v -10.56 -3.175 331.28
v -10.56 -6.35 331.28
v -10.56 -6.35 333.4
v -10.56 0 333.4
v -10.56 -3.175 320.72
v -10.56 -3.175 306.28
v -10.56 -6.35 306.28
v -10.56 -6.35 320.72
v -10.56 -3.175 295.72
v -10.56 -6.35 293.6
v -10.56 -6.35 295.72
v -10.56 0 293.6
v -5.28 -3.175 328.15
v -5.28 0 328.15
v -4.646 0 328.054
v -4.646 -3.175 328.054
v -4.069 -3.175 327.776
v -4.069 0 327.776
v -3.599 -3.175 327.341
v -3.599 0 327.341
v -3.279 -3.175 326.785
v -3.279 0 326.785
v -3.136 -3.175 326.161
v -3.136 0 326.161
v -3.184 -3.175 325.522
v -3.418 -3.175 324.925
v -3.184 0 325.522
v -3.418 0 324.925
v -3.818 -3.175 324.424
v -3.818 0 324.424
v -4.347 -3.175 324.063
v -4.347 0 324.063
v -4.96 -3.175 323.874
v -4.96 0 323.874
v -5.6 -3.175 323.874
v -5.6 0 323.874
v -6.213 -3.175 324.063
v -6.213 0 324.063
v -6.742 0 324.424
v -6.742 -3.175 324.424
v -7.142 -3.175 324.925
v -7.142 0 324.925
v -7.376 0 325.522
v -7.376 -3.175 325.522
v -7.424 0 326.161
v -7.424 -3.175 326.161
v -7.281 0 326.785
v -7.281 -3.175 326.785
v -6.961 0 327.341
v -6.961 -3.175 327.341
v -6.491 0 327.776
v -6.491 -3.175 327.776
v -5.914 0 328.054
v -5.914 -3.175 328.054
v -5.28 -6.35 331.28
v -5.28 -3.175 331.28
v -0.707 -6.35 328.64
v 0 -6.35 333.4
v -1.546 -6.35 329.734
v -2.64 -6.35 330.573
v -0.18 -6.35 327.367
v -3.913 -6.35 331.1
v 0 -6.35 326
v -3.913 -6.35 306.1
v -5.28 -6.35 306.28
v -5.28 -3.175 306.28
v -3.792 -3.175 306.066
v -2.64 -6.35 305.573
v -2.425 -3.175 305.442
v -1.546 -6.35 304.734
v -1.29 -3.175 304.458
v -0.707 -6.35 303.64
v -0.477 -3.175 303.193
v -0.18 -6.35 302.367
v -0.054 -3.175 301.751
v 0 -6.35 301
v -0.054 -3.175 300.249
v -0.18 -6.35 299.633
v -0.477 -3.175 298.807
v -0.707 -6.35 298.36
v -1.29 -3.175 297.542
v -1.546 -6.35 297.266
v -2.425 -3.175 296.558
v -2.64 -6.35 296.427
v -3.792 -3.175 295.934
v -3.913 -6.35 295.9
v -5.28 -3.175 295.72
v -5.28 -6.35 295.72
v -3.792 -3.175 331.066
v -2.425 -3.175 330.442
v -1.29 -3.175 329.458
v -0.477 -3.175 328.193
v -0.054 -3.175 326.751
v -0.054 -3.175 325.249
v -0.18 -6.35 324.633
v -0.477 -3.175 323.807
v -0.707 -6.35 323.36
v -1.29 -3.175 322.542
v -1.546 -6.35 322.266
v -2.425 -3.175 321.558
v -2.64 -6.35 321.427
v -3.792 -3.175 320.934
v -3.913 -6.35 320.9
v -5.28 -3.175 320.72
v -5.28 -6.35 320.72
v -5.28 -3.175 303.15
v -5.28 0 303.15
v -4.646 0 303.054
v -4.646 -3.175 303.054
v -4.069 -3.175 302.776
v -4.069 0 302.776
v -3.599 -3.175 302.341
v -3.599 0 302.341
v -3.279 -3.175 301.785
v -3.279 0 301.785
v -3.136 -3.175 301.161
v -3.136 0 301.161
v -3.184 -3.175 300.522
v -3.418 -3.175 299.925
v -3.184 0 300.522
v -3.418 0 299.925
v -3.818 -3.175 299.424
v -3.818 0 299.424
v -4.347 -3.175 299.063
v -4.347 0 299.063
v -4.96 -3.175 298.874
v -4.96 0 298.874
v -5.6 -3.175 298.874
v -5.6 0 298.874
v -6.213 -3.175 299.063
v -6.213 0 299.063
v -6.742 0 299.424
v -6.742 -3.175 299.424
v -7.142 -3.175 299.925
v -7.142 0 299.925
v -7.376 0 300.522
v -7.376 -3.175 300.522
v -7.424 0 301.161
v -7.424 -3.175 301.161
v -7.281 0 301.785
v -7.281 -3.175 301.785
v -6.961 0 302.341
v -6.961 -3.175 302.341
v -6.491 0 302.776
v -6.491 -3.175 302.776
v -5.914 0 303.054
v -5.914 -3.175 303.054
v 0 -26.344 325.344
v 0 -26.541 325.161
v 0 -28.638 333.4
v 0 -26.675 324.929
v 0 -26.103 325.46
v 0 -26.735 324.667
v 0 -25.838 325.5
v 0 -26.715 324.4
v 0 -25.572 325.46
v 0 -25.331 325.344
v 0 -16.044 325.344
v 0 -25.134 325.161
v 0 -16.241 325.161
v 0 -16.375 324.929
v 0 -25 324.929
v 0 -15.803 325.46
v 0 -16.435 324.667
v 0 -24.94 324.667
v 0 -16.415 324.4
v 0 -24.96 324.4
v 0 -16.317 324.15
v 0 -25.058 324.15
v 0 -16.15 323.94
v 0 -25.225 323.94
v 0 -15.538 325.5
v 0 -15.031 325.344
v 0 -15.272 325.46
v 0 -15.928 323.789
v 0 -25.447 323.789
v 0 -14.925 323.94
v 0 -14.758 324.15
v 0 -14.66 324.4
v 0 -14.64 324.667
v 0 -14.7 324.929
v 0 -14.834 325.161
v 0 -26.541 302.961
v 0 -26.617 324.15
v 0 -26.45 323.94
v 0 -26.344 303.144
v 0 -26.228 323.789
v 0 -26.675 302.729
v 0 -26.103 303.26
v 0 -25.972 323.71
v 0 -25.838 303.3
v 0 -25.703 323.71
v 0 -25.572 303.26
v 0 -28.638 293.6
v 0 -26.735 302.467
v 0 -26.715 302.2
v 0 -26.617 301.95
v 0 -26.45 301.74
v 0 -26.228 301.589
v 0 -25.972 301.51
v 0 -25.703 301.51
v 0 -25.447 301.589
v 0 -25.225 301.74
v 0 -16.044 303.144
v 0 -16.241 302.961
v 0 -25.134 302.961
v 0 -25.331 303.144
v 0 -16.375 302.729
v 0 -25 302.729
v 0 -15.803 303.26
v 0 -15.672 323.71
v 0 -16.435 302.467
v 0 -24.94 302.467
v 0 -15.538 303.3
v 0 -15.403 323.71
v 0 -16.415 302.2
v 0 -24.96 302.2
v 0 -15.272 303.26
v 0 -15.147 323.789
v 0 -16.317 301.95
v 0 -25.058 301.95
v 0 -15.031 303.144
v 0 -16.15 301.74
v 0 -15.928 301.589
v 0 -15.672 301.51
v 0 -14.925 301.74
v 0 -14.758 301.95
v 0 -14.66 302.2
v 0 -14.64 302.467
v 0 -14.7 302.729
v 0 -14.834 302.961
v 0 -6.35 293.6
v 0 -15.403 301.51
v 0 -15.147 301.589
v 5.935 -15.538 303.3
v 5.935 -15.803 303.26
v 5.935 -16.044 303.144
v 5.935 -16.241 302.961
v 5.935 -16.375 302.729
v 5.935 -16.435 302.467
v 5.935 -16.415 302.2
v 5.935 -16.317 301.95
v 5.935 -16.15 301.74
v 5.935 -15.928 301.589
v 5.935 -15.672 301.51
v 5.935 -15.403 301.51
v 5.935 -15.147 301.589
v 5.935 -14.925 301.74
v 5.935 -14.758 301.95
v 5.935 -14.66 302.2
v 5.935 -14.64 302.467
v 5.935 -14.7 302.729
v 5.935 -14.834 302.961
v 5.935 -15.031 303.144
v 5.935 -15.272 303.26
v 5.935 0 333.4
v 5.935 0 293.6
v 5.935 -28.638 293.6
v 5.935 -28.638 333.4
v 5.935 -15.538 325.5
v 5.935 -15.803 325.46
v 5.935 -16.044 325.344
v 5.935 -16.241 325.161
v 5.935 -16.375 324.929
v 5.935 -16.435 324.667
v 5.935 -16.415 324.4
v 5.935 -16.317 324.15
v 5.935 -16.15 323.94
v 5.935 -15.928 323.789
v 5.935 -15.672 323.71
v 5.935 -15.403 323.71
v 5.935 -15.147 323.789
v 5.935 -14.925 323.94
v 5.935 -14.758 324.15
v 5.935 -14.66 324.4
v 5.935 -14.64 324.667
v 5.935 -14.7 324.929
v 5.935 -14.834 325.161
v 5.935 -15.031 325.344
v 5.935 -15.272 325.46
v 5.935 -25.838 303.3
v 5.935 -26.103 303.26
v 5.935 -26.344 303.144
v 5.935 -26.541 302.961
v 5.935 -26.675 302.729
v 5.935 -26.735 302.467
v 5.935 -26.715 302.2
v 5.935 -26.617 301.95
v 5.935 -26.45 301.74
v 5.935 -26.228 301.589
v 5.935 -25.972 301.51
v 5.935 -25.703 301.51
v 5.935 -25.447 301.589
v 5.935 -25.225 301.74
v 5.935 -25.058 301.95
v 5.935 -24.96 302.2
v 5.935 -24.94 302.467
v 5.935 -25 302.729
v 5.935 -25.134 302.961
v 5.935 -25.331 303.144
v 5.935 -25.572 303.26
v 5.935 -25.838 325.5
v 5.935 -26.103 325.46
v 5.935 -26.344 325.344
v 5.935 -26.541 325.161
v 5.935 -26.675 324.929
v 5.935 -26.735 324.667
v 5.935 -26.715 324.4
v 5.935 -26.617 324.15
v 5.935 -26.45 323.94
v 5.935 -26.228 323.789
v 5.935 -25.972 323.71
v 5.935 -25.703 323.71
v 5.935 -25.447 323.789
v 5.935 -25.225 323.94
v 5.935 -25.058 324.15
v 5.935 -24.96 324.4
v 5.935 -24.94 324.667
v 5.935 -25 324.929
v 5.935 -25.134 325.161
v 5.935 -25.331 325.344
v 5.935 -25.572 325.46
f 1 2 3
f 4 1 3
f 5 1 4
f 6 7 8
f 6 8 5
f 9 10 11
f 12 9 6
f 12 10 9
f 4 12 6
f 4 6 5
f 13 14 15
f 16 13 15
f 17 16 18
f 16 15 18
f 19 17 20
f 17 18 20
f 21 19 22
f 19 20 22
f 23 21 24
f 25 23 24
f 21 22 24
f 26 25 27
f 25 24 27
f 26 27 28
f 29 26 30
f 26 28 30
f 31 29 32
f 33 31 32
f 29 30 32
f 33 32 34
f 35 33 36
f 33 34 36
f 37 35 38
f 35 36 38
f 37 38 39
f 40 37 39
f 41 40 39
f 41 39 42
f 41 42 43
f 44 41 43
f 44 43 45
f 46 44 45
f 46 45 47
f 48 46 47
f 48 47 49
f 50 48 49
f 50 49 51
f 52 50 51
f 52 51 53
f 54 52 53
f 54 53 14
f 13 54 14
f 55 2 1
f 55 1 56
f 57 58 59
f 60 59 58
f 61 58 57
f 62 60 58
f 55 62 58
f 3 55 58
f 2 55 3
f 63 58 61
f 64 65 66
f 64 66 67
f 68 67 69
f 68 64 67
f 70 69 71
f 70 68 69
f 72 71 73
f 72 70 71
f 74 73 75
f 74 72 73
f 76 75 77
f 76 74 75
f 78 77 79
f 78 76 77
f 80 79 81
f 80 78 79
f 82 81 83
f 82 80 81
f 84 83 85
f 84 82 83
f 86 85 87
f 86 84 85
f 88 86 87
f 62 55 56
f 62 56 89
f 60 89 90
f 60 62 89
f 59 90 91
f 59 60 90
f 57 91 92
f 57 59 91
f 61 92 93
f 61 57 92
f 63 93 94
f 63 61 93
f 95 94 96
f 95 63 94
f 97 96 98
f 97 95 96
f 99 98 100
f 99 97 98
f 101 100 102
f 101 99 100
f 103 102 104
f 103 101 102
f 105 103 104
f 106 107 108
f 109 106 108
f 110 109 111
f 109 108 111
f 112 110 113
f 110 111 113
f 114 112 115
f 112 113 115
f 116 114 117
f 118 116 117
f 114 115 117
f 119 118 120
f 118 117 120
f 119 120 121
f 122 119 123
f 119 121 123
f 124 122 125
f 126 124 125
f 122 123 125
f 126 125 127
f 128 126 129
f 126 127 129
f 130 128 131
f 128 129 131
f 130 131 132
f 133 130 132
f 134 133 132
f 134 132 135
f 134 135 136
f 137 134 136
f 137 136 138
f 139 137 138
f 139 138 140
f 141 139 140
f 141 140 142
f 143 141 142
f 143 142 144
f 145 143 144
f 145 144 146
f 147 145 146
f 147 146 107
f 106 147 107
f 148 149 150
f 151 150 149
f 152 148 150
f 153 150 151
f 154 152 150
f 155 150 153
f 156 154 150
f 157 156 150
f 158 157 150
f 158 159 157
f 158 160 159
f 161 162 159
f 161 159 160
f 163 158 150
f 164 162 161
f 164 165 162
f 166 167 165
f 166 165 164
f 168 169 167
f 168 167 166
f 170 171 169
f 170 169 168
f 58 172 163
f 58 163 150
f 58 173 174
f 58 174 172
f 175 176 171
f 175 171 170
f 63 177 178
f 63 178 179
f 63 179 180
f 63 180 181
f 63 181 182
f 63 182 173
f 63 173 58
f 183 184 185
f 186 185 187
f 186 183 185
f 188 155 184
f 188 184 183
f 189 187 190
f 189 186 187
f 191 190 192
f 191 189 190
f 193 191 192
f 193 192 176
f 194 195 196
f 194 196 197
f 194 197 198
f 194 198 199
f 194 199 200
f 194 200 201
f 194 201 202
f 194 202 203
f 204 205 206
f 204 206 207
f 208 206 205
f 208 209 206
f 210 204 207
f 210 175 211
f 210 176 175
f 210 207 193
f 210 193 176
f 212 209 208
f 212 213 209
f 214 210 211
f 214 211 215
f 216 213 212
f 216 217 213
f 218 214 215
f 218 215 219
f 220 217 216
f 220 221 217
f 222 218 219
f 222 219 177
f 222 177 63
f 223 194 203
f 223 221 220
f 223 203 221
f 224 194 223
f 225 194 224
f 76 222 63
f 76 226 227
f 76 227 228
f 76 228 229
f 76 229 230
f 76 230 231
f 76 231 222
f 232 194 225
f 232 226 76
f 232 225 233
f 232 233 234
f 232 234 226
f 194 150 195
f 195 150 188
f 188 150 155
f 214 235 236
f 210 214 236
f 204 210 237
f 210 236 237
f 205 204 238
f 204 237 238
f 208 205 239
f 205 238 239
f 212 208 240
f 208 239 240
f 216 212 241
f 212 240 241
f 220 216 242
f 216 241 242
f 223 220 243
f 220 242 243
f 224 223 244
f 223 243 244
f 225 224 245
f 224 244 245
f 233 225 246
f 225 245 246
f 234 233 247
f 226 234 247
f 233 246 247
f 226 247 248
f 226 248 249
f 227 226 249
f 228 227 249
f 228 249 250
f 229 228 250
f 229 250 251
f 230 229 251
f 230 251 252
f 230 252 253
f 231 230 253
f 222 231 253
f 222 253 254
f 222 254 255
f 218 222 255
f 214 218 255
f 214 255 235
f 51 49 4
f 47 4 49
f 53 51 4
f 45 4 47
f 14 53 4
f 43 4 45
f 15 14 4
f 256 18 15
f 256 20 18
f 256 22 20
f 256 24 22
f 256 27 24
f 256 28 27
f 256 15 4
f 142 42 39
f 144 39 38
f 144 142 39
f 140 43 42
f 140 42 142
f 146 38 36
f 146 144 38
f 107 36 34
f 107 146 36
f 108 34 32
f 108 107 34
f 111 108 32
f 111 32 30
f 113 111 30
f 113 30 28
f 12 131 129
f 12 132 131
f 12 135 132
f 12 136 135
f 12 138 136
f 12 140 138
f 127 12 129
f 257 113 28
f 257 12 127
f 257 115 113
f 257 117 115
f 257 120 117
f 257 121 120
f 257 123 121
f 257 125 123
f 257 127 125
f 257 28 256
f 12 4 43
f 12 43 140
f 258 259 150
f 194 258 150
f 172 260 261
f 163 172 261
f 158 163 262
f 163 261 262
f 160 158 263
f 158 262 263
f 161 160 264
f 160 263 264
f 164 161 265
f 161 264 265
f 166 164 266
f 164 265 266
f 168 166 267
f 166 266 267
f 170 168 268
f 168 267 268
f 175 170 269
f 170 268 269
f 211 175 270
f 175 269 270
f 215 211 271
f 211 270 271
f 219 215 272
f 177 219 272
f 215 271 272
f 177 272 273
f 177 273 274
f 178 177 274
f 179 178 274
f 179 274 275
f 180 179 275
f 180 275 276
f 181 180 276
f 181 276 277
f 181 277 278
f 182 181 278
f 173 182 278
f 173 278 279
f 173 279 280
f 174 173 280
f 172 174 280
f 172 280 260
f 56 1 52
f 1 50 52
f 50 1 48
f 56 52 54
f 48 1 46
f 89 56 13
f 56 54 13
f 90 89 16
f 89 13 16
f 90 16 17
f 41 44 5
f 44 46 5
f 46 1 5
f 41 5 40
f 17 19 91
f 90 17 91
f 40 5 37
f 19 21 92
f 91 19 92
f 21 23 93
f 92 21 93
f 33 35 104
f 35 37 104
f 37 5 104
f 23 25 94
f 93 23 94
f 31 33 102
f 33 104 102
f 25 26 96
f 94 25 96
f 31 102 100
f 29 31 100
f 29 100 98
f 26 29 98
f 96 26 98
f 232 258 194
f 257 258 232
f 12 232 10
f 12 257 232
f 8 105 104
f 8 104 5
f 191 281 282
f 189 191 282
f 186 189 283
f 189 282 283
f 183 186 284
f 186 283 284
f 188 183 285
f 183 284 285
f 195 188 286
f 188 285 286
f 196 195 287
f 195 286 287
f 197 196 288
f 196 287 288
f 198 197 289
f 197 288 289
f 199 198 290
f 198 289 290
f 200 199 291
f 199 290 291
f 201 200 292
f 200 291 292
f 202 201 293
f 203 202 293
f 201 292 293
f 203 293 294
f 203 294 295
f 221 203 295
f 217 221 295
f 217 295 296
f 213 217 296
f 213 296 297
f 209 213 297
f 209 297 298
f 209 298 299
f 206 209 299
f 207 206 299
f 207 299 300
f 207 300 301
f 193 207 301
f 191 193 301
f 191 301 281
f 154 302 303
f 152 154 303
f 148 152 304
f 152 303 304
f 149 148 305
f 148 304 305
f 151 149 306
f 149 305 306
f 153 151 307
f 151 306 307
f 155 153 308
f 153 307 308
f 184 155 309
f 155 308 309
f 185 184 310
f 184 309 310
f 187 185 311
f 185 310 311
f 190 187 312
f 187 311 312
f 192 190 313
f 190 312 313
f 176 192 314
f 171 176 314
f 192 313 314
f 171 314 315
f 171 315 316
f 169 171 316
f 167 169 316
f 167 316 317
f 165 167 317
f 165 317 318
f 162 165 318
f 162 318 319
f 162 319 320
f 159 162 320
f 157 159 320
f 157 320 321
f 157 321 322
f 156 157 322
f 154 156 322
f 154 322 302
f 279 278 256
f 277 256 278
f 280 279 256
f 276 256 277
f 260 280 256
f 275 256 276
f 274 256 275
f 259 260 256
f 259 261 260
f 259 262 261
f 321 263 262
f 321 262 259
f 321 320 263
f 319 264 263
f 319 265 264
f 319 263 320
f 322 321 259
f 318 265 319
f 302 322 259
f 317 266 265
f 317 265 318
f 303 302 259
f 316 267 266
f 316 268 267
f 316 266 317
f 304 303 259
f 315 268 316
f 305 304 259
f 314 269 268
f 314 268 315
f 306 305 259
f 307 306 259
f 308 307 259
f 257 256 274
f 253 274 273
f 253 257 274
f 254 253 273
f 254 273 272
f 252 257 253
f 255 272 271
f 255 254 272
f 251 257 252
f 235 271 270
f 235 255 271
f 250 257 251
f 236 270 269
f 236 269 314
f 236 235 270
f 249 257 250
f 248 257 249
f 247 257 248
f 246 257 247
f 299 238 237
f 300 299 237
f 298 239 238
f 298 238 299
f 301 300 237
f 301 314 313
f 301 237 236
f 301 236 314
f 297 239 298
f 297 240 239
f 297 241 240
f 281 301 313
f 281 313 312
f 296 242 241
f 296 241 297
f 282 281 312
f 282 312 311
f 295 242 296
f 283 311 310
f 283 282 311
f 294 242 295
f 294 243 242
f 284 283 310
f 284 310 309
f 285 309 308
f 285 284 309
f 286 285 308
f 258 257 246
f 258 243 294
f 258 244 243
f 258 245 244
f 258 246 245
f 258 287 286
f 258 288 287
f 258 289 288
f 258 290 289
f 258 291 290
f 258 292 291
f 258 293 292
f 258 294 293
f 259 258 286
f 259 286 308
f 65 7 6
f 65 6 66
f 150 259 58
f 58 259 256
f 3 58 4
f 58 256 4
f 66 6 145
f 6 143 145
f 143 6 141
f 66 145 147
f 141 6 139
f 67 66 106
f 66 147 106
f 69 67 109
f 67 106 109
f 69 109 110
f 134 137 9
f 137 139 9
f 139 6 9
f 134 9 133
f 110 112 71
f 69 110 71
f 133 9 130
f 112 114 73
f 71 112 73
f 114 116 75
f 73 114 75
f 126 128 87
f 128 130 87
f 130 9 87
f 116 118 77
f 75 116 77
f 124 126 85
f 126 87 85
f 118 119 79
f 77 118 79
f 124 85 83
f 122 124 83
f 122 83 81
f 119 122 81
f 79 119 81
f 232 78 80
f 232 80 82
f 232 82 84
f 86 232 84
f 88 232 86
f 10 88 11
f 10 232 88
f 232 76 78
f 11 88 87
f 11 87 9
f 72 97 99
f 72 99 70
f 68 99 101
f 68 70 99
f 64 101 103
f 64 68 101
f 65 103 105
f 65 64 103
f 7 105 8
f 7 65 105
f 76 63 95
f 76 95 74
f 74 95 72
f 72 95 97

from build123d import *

# Parameters (mm, degrees)
MAINBODY_EXTRUDE_START                    = 293.6
MAINBODY_EXTRUDE_DEPTH                    = 39.8
BOLSTEREDPLINTH_EXTRUDE_START             = -3.4
BOLSTEREDPLINTH_EXTRUDE_DEPTH             = 39.8
PROXIMALMOUNTHOLESCREWHEADLANDS_CUT_START = -6.35
PROXIMALMOUNTHOLESCREWHEADLANDS_CUT_DEPTH = 3.175
PROXIMALMOUNTSCREWHOLES_SKETCH_R          = 2.15
PROXIMALMOUNTHOLES_CUT_DEPTH              = 335.794235324
LIMITSWITCHMOUNTHOLES_HOLEWIZARD_D        = 1.8


with BuildPart() as part:
    # projectionZ_sketch → mainBody_extrude (new body)
    with BuildSketch(Plane.XY.offset(MAINBODY_EXTRUDE_START)):
        Polygon((3.175, -28.6375), (0, -28.6375), (0, -3.175), (-10.56, -3.175), (-10.56, 0), (3.175, 0), align=None)
    extrude(amount=MAINBODY_EXTRUDE_DEPTH)

    # bolsteredPlinthProjectionZ_sketch → bolsteredPlinth_extrude (add)
    with BuildSketch(Plane.XY.offset(297).offset(BOLSTEREDPLINTH_EXTRUDE_START)):
        Polygon((-10.56, 0), (5.935, 0), (5.935, -28.6375), (3.175, -28.6375), (0, -6.35), (-10.56, -6.35), align=None)
    extrude(amount=BOLSTEREDPLINTH_EXTRUDE_DEPTH)

    # proximalMountScrewHeadLands_sketch → proximalMountHoleScrewHeadLands_cut (cut)
    with BuildSketch(Plane(origin=(0, 0, 0), x_dir=(1, 0, 0), z_dir=(0, 1, 0)).offset(PROXIMALMOUNTHOLESCREWHEADLANDS_CUT_START)):
        with BuildLine():
            Line((-10.56, -331.280000019), (-5.28, -331.280000019))
            ThreePointArc((-5.28, -331.280000019), (0, -326.000000019), (-5.28, -320.720000019))
            Line((-5.28, -320.720000019), (-10.56, -320.720000019))
            Line((-10.56, -320.720000019), (-10.56, -331.280000019))
        make_face()
        with BuildLine():
            Line((-10.56, -306.279999981), (-5.28, -306.279999981))
            ThreePointArc((-5.28, -306.279999981), (0, -300.999999981), (-5.28, -295.719999981))
            Line((-5.28, -295.719999981), (-10.56, -295.719999981))
            Line((-10.56, -295.719999981), (-10.56, -306.279999981))
        make_face()
    extrude(amount=PROXIMALMOUNTHOLESCREWHEADLANDS_CUT_DEPTH, mode=Mode.SUBTRACT)

    # proximalMountScrewHoles_sketch → proximalMountHoles_cut (cut, through all)
    with BuildSketch(Plane(origin=(0, 0, 0), x_dir=(1, 0, 0), z_dir=(0, 1, 0))):
        with Locations(Location((-5.28, -326.000000019, 0), (0, 0, 270))):
            Circle(PROXIMALMOUNTSCREWHOLES_SKETCH_R)
        with Locations(Location((-5.28, -300.999999981, 0), (0, 0, 270))):
            Circle(PROXIMALMOUNTSCREWHOLES_SKETCH_R)
    extrude(amount=-PROXIMALMOUNTHOLES_CUT_DEPTH, mode=Mode.SUBTRACT)

    # limitSwitchMountHoles_holeWizard (through all)
    with Locations(Plane(origin=(0, 0, 0), x_dir=(0, 0, -1), z_dir=(-1, 0, 0))):
        with Locations((-302.4, 25.8375), (-302.4, 15.5375), (-324.6, 15.5375), (-324.6, 25.8375)):
            Hole(LIMITSWITCHMOUNTHOLES_HOLEWIZARD_D / 2)


solid = part.part
